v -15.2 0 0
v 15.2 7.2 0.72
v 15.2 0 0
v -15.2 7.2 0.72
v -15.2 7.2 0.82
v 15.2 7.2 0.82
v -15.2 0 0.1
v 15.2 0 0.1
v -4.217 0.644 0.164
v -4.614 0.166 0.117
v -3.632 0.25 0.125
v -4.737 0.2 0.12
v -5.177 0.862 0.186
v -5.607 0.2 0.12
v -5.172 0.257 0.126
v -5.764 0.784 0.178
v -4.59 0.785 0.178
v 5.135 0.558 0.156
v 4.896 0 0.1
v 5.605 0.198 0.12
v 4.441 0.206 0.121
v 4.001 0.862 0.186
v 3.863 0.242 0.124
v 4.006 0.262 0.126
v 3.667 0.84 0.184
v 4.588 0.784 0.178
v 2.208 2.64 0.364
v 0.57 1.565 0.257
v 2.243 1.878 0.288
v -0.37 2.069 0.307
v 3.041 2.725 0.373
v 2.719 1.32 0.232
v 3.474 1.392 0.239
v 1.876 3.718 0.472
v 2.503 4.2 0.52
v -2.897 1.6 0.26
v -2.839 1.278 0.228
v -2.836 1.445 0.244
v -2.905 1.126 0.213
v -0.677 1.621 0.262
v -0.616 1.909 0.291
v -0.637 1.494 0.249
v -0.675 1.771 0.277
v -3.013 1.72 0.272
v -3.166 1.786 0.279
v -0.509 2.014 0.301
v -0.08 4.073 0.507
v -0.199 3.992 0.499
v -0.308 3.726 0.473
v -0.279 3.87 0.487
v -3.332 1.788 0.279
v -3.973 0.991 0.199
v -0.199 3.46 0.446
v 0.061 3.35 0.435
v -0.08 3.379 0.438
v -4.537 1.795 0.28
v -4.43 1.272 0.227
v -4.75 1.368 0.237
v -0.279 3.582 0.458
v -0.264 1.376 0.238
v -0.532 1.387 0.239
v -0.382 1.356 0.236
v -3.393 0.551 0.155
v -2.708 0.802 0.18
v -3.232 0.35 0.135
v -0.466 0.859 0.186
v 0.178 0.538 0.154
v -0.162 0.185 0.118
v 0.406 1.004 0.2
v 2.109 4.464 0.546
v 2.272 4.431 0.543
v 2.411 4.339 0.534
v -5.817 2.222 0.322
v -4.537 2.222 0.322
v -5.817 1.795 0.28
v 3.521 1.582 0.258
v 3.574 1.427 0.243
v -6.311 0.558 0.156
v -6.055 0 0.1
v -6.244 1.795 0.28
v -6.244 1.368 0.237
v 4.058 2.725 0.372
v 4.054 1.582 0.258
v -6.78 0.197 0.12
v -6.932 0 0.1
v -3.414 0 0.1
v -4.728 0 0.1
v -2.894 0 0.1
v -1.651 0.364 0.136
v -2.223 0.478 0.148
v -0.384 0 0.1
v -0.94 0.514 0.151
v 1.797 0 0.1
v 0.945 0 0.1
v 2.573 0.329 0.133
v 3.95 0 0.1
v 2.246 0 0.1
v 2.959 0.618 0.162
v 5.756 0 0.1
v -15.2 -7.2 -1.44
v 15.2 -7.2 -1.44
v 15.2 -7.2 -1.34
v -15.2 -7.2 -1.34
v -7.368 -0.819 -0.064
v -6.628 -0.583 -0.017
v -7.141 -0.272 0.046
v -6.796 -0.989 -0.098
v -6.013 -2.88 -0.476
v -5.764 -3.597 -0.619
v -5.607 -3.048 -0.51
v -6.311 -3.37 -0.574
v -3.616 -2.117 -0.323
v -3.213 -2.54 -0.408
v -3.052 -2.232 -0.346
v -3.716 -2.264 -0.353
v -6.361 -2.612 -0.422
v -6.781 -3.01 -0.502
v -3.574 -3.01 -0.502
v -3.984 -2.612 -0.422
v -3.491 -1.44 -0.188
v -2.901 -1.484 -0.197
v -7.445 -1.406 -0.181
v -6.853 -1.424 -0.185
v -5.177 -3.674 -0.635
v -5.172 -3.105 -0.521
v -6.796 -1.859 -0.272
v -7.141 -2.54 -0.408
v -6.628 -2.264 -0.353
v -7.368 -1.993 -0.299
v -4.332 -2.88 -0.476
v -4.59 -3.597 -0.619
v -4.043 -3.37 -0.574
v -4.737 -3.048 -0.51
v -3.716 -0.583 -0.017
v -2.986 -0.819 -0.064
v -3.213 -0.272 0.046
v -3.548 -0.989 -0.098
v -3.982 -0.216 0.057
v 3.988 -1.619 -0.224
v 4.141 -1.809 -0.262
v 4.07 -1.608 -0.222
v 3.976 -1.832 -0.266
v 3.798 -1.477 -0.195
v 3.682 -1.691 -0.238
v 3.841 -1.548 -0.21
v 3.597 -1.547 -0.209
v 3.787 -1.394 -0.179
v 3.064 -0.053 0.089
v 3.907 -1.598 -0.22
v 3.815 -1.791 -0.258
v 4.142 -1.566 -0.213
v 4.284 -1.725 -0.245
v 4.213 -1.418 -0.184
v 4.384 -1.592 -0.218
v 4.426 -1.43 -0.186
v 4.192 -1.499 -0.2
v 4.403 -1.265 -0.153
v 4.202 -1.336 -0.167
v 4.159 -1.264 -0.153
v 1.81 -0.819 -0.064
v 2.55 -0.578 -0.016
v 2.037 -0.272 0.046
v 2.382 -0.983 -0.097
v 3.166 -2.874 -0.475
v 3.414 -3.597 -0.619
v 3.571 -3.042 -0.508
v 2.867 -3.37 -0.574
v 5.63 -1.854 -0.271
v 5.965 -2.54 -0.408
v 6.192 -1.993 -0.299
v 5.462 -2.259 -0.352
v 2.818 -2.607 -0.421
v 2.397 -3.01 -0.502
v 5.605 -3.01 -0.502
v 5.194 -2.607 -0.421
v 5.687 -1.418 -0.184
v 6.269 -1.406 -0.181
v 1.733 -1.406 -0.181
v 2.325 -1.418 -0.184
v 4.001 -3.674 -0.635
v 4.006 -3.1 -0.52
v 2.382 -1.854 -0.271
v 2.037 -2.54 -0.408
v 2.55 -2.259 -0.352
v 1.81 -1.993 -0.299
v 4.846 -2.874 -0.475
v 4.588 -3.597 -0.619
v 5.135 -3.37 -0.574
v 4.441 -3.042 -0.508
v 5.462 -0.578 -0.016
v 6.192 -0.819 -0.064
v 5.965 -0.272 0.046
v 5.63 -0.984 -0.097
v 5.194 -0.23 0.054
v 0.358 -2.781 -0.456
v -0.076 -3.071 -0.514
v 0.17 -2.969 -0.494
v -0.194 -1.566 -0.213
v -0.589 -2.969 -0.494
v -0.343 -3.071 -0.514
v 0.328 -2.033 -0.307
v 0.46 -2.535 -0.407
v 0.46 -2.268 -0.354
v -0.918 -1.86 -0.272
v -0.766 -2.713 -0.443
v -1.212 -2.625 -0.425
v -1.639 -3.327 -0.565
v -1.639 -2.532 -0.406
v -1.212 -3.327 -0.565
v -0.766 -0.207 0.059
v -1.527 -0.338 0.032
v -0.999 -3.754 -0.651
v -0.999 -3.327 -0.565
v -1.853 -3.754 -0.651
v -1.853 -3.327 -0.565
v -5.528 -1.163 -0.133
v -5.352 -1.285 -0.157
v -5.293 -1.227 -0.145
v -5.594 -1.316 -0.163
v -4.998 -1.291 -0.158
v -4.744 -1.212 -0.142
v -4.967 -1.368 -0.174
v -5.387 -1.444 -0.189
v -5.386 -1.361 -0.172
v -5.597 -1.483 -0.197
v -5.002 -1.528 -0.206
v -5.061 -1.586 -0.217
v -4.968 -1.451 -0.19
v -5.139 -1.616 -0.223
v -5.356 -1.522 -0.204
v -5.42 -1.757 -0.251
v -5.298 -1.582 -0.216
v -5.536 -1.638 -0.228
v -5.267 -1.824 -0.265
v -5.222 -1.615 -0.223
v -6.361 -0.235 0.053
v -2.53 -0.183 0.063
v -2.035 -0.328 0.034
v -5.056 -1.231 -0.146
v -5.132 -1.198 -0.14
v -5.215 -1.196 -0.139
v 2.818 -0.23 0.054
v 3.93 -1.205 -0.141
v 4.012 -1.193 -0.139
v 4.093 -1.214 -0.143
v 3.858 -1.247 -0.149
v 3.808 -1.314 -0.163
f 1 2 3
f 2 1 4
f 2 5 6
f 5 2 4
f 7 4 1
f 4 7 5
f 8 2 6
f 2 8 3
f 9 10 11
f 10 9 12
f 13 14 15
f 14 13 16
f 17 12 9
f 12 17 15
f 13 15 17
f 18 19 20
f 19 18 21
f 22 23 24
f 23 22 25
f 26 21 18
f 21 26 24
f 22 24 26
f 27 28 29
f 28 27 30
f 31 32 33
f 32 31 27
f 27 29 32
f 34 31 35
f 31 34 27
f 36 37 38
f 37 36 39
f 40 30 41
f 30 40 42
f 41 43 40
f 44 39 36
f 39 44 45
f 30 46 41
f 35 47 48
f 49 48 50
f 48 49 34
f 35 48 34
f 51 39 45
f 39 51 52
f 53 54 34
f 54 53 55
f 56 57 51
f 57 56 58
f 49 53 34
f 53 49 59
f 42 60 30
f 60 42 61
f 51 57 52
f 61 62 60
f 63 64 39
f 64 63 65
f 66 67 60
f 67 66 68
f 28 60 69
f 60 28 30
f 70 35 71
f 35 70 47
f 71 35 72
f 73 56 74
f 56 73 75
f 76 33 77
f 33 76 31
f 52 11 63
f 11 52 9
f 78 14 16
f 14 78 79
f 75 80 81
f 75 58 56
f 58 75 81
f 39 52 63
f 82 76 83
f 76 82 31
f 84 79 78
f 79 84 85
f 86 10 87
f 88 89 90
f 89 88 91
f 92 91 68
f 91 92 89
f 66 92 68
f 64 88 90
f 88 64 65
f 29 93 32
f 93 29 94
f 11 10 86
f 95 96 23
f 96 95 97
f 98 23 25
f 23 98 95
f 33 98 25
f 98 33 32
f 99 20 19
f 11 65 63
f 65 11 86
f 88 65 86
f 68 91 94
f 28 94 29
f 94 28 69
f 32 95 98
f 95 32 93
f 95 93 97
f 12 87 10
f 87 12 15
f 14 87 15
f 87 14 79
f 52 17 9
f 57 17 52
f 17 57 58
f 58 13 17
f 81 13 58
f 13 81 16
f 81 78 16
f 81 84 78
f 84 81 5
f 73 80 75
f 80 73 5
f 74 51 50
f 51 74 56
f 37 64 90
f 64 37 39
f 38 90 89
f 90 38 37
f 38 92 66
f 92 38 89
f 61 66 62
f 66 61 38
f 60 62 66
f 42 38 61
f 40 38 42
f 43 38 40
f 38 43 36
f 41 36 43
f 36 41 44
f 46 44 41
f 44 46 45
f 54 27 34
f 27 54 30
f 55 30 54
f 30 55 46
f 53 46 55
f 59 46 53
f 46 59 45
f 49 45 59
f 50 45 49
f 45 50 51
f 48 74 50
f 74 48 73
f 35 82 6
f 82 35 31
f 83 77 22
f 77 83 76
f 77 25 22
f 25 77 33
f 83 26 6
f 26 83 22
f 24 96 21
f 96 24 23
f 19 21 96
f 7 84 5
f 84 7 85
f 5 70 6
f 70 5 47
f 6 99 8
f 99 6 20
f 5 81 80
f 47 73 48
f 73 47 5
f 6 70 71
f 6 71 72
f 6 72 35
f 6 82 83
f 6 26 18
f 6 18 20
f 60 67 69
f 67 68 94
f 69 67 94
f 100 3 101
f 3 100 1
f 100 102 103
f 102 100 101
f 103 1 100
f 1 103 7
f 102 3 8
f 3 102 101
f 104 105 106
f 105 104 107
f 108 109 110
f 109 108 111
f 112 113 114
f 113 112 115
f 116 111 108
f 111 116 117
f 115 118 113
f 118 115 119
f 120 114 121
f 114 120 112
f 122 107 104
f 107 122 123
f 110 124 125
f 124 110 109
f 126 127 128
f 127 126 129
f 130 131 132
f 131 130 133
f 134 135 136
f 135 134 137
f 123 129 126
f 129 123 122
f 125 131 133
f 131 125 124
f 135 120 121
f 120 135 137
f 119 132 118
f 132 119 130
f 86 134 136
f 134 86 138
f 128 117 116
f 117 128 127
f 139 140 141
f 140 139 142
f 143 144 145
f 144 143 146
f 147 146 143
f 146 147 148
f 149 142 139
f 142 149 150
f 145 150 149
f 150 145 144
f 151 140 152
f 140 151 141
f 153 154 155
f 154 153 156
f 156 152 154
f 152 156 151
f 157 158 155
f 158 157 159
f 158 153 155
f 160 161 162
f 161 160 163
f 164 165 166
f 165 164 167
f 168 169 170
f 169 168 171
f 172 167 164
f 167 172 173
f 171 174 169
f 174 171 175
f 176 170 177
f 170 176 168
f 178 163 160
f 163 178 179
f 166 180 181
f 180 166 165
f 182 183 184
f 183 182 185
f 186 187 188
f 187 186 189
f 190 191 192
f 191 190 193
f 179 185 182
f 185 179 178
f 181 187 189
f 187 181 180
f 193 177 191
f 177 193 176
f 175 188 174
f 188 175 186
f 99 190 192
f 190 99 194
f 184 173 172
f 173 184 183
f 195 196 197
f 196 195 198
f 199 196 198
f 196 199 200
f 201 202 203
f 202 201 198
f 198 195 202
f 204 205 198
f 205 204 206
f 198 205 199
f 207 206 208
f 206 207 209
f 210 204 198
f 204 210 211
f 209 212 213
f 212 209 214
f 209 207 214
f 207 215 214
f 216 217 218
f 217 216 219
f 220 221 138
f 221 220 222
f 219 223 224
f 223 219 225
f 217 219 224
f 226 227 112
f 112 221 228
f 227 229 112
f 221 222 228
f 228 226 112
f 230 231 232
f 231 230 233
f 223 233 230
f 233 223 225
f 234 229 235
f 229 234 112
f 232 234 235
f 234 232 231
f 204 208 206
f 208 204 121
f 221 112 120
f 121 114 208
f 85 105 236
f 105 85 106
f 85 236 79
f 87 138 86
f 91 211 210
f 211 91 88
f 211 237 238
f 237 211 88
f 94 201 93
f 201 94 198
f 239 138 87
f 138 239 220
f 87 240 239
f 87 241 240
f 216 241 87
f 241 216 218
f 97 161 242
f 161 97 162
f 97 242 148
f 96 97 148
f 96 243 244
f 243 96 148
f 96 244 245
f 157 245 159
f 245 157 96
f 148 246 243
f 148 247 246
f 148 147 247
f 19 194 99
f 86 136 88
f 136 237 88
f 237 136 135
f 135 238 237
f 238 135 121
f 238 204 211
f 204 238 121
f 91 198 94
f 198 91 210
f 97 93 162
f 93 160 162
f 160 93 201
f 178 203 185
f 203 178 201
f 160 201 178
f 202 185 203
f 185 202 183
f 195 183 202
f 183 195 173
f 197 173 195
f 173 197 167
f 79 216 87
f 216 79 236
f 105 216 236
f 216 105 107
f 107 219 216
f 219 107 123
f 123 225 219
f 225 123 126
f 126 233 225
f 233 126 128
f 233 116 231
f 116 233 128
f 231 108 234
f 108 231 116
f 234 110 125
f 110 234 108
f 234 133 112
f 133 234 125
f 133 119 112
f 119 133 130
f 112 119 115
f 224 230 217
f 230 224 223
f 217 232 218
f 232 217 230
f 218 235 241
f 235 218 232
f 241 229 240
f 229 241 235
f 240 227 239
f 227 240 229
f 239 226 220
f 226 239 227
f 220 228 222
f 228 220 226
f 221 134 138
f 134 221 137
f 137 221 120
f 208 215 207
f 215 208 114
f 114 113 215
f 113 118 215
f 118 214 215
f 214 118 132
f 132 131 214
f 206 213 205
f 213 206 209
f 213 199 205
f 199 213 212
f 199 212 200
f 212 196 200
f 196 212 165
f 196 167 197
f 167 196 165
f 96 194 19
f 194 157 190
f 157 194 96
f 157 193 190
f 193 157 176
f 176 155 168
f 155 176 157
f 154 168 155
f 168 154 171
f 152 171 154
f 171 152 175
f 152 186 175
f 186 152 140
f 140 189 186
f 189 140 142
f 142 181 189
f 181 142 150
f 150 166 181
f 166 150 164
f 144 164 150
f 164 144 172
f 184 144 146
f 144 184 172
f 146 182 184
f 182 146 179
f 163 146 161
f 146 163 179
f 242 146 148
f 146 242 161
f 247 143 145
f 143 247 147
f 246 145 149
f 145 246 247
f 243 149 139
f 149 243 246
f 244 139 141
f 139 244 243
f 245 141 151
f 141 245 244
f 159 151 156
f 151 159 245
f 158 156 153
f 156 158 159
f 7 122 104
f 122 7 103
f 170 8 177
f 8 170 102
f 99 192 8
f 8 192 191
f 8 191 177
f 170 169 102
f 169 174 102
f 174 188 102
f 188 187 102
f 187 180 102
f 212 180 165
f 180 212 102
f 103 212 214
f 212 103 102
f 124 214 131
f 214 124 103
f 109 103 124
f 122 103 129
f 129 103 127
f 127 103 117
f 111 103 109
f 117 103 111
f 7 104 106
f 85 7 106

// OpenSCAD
// file: ../p/box4-12.scad
use <../lib.scad>
function ldraw_lib__box4_12() = [
// 0 Box with 4 Faces without Any Edges
// 0 Name: box4-12.dat
// 0 Author: J.C. Tchang [tchang]
// 0 !LDRAW_ORG Primitive UPDATE 2019-01
// 0 !LICENSE Licensed under CC BY 4.0 : see CAreadme.txt
// 
// 0 BFC CERTIFY CCW
  [0,"BFC","CERTIFY"],
  [0,"BFC","CCW"],
// 
// 0 !HISTORY 2019-06-28 [PTadmin] Official Update 2019-01
// 
// 
// 4 16 -1 1 1 1 1 1 1 1 -1 -1 1 -1
  [4,16,-1,1,1,1,1,1,1,1,-1,-1,1,-1],
// 4 16 -1 1 1 -1 0 1 1 0 1 1 1 1
  [4,16,-1,1,1,-1,0,1,1,0,1,1,1,1],
// 4 16 -1 1 -1 -1 0 -1 -1 0 1 -1 1 1
  [4,16,-1,1,-1,-1,0,-1,-1,0,1,-1,1,1],
// 4 16 1 1 1 1 0 1 1 0 -1 1 1 -1
  [4,16,1,1,1,1,0,1,1,0,-1,1,1,-1],
];
module ldraw_lib__box4_12(step=0, col=false, unit=2/5, alt=false, line=0.2, solid=!$preview)
    makepoly(ldraw_lib__box4_12(), step=step, col=col, unit=unit, alt=alt, line=line, solid=solid);
ldraw_lib__box4_12(line=0.2);
// main file
use <../lib.scad>
use <s/6109079bs01.scad>
use <s/6109079bs02.scad>
function ldraw_lib__6109079bc01() = [
// 0 Sticker  1.8 x  3.8 with Lime Bicycle Icon (Formed)
// 0 Name: 6109079bc01.dat
// 0 Author: Gerald Lasser [GeraldLasser]
// 0 !LDRAW_ORG Part UPDATE 2020-03
// 0 !LICENSE Licensed under CC BY 4.0 : see CAreadme.txt
// 
// 0 !HELP !ATTACHTO 46413.dat 0 2 -40 1 0 0 0 1 0 0 0 1
// 
// 0 BFC CERTIFY CCW
  [0,"BFC","CERTIFY"],
  [0,"BFC","CCW"],
// 
// 0 !KEYWORDS Set 60097
// 
// 0 !HISTORY 2020-12-29 [PTadmin] Official Update 2020-03
// 
// 
// 1 16 0 0 0 1 0 0 0 1 -0.1 0 0 1 s\6109079bs01.dat
  [1,16,0,0,0,1,0,0,0,1,-0.1,0,0,1, ldraw_lib__s__6109079bs01()],
// 1 16 0 0 0 1 0 0 0 1 -0.2 0 0 1 s\6109079bs02.dat
  [1,16,0,0,0,1,0,0,0,1,-0.2,0,0,1, ldraw_lib__s__6109079bs02()],
// 
// 5 24 -38 -.25 0 38 -.25 0 38 -2.05 18 38 3.35 -18
  [5,24,-38,-.25,0,38,-.25,0,38,-2.05,18,38,3.35,-18],
];
module ldraw_lib__6109079bc01(step=0, col=false, unit=2/5, alt=false, line=0.2, solid=!$preview)
    makepoly(ldraw_lib__6109079bc01(), step=step, col=col, unit=unit, alt=alt, line=line, solid=solid);
ldraw_lib__6109079bc01(line=0.2);
